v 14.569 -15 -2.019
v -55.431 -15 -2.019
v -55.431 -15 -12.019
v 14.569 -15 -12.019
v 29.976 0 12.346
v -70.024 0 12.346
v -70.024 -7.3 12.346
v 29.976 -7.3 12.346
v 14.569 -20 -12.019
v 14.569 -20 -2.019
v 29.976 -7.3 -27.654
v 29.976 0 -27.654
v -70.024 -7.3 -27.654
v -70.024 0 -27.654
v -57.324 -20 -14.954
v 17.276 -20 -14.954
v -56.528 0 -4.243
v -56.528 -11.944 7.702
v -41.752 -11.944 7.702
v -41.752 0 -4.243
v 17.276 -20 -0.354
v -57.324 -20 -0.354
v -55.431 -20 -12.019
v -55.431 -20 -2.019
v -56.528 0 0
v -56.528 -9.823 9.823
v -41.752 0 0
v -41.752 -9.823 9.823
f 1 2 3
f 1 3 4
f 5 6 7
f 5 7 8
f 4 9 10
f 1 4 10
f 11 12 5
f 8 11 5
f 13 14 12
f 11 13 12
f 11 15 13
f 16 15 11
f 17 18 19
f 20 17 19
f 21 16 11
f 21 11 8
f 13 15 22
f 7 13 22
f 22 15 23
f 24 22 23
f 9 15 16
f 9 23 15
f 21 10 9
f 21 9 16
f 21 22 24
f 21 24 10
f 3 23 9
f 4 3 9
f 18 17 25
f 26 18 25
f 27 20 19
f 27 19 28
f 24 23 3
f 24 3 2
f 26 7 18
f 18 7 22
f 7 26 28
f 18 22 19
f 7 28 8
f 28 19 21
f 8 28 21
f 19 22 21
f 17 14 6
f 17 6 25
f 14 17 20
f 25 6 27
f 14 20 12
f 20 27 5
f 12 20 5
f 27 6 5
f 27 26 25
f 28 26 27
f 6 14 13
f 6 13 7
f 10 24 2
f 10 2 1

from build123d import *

# Parameters (mm, degrees)
F0_W     = 100
F0_H     = 40
F1_DEPTH = 20
F2_SIZE  = 12.7
F3_W     = 14.7754922509
F3_H     = 3
F4_DEPTH = 25
F5_W     = 70
F5_H     = 10
F6_DEPTH = 5


with BuildPart() as f1:
    # F0 (on Front) → F1 (new body)
    with BuildSketch(Plane.XZ):
        with Locations((-20.0241699815, -7.6543013752)):
            Rectangle(F0_W, F0_H)
    extrude(amount=F1_DEPTH)

    # F2
    f2_edges = [f1.edges().sort_by_distance(p)[0] for p in [
        (-70.02417, -20, -7.654301),
        (29.97583, -20, -7.654301),
        (-20.02417, -20, -27.654301),
        (-20.02417, -20, 12.345699),
    ]]
    chamfer(f2_edges, length=F2_SIZE)

    # F3 (on face) → F4 (cut)
    with BuildSketch(Plane(origin=(0, -9.8228493124, 9.8228493124), x_dir=(1, 0, 0), z_dir=(0, -0.7071067812, 0.7071067812))):
        with Locations((-49.1398386657, -1.5)):
            Rectangle(F3_W, F3_H)
    extrude(amount=-F4_DEPTH, mode=Mode.SUBTRACT)

    # F5 (on face) → F6 (cut)
    with BuildSketch(Plane.XZ.offset(20)):
        with Locations((-20.430685021, -7.0188848879)):
            Rectangle(F5_W, F5_H)
    extrude(amount=-F6_DEPTH, mode=Mode.SUBTRACT)


solid = f1.part
